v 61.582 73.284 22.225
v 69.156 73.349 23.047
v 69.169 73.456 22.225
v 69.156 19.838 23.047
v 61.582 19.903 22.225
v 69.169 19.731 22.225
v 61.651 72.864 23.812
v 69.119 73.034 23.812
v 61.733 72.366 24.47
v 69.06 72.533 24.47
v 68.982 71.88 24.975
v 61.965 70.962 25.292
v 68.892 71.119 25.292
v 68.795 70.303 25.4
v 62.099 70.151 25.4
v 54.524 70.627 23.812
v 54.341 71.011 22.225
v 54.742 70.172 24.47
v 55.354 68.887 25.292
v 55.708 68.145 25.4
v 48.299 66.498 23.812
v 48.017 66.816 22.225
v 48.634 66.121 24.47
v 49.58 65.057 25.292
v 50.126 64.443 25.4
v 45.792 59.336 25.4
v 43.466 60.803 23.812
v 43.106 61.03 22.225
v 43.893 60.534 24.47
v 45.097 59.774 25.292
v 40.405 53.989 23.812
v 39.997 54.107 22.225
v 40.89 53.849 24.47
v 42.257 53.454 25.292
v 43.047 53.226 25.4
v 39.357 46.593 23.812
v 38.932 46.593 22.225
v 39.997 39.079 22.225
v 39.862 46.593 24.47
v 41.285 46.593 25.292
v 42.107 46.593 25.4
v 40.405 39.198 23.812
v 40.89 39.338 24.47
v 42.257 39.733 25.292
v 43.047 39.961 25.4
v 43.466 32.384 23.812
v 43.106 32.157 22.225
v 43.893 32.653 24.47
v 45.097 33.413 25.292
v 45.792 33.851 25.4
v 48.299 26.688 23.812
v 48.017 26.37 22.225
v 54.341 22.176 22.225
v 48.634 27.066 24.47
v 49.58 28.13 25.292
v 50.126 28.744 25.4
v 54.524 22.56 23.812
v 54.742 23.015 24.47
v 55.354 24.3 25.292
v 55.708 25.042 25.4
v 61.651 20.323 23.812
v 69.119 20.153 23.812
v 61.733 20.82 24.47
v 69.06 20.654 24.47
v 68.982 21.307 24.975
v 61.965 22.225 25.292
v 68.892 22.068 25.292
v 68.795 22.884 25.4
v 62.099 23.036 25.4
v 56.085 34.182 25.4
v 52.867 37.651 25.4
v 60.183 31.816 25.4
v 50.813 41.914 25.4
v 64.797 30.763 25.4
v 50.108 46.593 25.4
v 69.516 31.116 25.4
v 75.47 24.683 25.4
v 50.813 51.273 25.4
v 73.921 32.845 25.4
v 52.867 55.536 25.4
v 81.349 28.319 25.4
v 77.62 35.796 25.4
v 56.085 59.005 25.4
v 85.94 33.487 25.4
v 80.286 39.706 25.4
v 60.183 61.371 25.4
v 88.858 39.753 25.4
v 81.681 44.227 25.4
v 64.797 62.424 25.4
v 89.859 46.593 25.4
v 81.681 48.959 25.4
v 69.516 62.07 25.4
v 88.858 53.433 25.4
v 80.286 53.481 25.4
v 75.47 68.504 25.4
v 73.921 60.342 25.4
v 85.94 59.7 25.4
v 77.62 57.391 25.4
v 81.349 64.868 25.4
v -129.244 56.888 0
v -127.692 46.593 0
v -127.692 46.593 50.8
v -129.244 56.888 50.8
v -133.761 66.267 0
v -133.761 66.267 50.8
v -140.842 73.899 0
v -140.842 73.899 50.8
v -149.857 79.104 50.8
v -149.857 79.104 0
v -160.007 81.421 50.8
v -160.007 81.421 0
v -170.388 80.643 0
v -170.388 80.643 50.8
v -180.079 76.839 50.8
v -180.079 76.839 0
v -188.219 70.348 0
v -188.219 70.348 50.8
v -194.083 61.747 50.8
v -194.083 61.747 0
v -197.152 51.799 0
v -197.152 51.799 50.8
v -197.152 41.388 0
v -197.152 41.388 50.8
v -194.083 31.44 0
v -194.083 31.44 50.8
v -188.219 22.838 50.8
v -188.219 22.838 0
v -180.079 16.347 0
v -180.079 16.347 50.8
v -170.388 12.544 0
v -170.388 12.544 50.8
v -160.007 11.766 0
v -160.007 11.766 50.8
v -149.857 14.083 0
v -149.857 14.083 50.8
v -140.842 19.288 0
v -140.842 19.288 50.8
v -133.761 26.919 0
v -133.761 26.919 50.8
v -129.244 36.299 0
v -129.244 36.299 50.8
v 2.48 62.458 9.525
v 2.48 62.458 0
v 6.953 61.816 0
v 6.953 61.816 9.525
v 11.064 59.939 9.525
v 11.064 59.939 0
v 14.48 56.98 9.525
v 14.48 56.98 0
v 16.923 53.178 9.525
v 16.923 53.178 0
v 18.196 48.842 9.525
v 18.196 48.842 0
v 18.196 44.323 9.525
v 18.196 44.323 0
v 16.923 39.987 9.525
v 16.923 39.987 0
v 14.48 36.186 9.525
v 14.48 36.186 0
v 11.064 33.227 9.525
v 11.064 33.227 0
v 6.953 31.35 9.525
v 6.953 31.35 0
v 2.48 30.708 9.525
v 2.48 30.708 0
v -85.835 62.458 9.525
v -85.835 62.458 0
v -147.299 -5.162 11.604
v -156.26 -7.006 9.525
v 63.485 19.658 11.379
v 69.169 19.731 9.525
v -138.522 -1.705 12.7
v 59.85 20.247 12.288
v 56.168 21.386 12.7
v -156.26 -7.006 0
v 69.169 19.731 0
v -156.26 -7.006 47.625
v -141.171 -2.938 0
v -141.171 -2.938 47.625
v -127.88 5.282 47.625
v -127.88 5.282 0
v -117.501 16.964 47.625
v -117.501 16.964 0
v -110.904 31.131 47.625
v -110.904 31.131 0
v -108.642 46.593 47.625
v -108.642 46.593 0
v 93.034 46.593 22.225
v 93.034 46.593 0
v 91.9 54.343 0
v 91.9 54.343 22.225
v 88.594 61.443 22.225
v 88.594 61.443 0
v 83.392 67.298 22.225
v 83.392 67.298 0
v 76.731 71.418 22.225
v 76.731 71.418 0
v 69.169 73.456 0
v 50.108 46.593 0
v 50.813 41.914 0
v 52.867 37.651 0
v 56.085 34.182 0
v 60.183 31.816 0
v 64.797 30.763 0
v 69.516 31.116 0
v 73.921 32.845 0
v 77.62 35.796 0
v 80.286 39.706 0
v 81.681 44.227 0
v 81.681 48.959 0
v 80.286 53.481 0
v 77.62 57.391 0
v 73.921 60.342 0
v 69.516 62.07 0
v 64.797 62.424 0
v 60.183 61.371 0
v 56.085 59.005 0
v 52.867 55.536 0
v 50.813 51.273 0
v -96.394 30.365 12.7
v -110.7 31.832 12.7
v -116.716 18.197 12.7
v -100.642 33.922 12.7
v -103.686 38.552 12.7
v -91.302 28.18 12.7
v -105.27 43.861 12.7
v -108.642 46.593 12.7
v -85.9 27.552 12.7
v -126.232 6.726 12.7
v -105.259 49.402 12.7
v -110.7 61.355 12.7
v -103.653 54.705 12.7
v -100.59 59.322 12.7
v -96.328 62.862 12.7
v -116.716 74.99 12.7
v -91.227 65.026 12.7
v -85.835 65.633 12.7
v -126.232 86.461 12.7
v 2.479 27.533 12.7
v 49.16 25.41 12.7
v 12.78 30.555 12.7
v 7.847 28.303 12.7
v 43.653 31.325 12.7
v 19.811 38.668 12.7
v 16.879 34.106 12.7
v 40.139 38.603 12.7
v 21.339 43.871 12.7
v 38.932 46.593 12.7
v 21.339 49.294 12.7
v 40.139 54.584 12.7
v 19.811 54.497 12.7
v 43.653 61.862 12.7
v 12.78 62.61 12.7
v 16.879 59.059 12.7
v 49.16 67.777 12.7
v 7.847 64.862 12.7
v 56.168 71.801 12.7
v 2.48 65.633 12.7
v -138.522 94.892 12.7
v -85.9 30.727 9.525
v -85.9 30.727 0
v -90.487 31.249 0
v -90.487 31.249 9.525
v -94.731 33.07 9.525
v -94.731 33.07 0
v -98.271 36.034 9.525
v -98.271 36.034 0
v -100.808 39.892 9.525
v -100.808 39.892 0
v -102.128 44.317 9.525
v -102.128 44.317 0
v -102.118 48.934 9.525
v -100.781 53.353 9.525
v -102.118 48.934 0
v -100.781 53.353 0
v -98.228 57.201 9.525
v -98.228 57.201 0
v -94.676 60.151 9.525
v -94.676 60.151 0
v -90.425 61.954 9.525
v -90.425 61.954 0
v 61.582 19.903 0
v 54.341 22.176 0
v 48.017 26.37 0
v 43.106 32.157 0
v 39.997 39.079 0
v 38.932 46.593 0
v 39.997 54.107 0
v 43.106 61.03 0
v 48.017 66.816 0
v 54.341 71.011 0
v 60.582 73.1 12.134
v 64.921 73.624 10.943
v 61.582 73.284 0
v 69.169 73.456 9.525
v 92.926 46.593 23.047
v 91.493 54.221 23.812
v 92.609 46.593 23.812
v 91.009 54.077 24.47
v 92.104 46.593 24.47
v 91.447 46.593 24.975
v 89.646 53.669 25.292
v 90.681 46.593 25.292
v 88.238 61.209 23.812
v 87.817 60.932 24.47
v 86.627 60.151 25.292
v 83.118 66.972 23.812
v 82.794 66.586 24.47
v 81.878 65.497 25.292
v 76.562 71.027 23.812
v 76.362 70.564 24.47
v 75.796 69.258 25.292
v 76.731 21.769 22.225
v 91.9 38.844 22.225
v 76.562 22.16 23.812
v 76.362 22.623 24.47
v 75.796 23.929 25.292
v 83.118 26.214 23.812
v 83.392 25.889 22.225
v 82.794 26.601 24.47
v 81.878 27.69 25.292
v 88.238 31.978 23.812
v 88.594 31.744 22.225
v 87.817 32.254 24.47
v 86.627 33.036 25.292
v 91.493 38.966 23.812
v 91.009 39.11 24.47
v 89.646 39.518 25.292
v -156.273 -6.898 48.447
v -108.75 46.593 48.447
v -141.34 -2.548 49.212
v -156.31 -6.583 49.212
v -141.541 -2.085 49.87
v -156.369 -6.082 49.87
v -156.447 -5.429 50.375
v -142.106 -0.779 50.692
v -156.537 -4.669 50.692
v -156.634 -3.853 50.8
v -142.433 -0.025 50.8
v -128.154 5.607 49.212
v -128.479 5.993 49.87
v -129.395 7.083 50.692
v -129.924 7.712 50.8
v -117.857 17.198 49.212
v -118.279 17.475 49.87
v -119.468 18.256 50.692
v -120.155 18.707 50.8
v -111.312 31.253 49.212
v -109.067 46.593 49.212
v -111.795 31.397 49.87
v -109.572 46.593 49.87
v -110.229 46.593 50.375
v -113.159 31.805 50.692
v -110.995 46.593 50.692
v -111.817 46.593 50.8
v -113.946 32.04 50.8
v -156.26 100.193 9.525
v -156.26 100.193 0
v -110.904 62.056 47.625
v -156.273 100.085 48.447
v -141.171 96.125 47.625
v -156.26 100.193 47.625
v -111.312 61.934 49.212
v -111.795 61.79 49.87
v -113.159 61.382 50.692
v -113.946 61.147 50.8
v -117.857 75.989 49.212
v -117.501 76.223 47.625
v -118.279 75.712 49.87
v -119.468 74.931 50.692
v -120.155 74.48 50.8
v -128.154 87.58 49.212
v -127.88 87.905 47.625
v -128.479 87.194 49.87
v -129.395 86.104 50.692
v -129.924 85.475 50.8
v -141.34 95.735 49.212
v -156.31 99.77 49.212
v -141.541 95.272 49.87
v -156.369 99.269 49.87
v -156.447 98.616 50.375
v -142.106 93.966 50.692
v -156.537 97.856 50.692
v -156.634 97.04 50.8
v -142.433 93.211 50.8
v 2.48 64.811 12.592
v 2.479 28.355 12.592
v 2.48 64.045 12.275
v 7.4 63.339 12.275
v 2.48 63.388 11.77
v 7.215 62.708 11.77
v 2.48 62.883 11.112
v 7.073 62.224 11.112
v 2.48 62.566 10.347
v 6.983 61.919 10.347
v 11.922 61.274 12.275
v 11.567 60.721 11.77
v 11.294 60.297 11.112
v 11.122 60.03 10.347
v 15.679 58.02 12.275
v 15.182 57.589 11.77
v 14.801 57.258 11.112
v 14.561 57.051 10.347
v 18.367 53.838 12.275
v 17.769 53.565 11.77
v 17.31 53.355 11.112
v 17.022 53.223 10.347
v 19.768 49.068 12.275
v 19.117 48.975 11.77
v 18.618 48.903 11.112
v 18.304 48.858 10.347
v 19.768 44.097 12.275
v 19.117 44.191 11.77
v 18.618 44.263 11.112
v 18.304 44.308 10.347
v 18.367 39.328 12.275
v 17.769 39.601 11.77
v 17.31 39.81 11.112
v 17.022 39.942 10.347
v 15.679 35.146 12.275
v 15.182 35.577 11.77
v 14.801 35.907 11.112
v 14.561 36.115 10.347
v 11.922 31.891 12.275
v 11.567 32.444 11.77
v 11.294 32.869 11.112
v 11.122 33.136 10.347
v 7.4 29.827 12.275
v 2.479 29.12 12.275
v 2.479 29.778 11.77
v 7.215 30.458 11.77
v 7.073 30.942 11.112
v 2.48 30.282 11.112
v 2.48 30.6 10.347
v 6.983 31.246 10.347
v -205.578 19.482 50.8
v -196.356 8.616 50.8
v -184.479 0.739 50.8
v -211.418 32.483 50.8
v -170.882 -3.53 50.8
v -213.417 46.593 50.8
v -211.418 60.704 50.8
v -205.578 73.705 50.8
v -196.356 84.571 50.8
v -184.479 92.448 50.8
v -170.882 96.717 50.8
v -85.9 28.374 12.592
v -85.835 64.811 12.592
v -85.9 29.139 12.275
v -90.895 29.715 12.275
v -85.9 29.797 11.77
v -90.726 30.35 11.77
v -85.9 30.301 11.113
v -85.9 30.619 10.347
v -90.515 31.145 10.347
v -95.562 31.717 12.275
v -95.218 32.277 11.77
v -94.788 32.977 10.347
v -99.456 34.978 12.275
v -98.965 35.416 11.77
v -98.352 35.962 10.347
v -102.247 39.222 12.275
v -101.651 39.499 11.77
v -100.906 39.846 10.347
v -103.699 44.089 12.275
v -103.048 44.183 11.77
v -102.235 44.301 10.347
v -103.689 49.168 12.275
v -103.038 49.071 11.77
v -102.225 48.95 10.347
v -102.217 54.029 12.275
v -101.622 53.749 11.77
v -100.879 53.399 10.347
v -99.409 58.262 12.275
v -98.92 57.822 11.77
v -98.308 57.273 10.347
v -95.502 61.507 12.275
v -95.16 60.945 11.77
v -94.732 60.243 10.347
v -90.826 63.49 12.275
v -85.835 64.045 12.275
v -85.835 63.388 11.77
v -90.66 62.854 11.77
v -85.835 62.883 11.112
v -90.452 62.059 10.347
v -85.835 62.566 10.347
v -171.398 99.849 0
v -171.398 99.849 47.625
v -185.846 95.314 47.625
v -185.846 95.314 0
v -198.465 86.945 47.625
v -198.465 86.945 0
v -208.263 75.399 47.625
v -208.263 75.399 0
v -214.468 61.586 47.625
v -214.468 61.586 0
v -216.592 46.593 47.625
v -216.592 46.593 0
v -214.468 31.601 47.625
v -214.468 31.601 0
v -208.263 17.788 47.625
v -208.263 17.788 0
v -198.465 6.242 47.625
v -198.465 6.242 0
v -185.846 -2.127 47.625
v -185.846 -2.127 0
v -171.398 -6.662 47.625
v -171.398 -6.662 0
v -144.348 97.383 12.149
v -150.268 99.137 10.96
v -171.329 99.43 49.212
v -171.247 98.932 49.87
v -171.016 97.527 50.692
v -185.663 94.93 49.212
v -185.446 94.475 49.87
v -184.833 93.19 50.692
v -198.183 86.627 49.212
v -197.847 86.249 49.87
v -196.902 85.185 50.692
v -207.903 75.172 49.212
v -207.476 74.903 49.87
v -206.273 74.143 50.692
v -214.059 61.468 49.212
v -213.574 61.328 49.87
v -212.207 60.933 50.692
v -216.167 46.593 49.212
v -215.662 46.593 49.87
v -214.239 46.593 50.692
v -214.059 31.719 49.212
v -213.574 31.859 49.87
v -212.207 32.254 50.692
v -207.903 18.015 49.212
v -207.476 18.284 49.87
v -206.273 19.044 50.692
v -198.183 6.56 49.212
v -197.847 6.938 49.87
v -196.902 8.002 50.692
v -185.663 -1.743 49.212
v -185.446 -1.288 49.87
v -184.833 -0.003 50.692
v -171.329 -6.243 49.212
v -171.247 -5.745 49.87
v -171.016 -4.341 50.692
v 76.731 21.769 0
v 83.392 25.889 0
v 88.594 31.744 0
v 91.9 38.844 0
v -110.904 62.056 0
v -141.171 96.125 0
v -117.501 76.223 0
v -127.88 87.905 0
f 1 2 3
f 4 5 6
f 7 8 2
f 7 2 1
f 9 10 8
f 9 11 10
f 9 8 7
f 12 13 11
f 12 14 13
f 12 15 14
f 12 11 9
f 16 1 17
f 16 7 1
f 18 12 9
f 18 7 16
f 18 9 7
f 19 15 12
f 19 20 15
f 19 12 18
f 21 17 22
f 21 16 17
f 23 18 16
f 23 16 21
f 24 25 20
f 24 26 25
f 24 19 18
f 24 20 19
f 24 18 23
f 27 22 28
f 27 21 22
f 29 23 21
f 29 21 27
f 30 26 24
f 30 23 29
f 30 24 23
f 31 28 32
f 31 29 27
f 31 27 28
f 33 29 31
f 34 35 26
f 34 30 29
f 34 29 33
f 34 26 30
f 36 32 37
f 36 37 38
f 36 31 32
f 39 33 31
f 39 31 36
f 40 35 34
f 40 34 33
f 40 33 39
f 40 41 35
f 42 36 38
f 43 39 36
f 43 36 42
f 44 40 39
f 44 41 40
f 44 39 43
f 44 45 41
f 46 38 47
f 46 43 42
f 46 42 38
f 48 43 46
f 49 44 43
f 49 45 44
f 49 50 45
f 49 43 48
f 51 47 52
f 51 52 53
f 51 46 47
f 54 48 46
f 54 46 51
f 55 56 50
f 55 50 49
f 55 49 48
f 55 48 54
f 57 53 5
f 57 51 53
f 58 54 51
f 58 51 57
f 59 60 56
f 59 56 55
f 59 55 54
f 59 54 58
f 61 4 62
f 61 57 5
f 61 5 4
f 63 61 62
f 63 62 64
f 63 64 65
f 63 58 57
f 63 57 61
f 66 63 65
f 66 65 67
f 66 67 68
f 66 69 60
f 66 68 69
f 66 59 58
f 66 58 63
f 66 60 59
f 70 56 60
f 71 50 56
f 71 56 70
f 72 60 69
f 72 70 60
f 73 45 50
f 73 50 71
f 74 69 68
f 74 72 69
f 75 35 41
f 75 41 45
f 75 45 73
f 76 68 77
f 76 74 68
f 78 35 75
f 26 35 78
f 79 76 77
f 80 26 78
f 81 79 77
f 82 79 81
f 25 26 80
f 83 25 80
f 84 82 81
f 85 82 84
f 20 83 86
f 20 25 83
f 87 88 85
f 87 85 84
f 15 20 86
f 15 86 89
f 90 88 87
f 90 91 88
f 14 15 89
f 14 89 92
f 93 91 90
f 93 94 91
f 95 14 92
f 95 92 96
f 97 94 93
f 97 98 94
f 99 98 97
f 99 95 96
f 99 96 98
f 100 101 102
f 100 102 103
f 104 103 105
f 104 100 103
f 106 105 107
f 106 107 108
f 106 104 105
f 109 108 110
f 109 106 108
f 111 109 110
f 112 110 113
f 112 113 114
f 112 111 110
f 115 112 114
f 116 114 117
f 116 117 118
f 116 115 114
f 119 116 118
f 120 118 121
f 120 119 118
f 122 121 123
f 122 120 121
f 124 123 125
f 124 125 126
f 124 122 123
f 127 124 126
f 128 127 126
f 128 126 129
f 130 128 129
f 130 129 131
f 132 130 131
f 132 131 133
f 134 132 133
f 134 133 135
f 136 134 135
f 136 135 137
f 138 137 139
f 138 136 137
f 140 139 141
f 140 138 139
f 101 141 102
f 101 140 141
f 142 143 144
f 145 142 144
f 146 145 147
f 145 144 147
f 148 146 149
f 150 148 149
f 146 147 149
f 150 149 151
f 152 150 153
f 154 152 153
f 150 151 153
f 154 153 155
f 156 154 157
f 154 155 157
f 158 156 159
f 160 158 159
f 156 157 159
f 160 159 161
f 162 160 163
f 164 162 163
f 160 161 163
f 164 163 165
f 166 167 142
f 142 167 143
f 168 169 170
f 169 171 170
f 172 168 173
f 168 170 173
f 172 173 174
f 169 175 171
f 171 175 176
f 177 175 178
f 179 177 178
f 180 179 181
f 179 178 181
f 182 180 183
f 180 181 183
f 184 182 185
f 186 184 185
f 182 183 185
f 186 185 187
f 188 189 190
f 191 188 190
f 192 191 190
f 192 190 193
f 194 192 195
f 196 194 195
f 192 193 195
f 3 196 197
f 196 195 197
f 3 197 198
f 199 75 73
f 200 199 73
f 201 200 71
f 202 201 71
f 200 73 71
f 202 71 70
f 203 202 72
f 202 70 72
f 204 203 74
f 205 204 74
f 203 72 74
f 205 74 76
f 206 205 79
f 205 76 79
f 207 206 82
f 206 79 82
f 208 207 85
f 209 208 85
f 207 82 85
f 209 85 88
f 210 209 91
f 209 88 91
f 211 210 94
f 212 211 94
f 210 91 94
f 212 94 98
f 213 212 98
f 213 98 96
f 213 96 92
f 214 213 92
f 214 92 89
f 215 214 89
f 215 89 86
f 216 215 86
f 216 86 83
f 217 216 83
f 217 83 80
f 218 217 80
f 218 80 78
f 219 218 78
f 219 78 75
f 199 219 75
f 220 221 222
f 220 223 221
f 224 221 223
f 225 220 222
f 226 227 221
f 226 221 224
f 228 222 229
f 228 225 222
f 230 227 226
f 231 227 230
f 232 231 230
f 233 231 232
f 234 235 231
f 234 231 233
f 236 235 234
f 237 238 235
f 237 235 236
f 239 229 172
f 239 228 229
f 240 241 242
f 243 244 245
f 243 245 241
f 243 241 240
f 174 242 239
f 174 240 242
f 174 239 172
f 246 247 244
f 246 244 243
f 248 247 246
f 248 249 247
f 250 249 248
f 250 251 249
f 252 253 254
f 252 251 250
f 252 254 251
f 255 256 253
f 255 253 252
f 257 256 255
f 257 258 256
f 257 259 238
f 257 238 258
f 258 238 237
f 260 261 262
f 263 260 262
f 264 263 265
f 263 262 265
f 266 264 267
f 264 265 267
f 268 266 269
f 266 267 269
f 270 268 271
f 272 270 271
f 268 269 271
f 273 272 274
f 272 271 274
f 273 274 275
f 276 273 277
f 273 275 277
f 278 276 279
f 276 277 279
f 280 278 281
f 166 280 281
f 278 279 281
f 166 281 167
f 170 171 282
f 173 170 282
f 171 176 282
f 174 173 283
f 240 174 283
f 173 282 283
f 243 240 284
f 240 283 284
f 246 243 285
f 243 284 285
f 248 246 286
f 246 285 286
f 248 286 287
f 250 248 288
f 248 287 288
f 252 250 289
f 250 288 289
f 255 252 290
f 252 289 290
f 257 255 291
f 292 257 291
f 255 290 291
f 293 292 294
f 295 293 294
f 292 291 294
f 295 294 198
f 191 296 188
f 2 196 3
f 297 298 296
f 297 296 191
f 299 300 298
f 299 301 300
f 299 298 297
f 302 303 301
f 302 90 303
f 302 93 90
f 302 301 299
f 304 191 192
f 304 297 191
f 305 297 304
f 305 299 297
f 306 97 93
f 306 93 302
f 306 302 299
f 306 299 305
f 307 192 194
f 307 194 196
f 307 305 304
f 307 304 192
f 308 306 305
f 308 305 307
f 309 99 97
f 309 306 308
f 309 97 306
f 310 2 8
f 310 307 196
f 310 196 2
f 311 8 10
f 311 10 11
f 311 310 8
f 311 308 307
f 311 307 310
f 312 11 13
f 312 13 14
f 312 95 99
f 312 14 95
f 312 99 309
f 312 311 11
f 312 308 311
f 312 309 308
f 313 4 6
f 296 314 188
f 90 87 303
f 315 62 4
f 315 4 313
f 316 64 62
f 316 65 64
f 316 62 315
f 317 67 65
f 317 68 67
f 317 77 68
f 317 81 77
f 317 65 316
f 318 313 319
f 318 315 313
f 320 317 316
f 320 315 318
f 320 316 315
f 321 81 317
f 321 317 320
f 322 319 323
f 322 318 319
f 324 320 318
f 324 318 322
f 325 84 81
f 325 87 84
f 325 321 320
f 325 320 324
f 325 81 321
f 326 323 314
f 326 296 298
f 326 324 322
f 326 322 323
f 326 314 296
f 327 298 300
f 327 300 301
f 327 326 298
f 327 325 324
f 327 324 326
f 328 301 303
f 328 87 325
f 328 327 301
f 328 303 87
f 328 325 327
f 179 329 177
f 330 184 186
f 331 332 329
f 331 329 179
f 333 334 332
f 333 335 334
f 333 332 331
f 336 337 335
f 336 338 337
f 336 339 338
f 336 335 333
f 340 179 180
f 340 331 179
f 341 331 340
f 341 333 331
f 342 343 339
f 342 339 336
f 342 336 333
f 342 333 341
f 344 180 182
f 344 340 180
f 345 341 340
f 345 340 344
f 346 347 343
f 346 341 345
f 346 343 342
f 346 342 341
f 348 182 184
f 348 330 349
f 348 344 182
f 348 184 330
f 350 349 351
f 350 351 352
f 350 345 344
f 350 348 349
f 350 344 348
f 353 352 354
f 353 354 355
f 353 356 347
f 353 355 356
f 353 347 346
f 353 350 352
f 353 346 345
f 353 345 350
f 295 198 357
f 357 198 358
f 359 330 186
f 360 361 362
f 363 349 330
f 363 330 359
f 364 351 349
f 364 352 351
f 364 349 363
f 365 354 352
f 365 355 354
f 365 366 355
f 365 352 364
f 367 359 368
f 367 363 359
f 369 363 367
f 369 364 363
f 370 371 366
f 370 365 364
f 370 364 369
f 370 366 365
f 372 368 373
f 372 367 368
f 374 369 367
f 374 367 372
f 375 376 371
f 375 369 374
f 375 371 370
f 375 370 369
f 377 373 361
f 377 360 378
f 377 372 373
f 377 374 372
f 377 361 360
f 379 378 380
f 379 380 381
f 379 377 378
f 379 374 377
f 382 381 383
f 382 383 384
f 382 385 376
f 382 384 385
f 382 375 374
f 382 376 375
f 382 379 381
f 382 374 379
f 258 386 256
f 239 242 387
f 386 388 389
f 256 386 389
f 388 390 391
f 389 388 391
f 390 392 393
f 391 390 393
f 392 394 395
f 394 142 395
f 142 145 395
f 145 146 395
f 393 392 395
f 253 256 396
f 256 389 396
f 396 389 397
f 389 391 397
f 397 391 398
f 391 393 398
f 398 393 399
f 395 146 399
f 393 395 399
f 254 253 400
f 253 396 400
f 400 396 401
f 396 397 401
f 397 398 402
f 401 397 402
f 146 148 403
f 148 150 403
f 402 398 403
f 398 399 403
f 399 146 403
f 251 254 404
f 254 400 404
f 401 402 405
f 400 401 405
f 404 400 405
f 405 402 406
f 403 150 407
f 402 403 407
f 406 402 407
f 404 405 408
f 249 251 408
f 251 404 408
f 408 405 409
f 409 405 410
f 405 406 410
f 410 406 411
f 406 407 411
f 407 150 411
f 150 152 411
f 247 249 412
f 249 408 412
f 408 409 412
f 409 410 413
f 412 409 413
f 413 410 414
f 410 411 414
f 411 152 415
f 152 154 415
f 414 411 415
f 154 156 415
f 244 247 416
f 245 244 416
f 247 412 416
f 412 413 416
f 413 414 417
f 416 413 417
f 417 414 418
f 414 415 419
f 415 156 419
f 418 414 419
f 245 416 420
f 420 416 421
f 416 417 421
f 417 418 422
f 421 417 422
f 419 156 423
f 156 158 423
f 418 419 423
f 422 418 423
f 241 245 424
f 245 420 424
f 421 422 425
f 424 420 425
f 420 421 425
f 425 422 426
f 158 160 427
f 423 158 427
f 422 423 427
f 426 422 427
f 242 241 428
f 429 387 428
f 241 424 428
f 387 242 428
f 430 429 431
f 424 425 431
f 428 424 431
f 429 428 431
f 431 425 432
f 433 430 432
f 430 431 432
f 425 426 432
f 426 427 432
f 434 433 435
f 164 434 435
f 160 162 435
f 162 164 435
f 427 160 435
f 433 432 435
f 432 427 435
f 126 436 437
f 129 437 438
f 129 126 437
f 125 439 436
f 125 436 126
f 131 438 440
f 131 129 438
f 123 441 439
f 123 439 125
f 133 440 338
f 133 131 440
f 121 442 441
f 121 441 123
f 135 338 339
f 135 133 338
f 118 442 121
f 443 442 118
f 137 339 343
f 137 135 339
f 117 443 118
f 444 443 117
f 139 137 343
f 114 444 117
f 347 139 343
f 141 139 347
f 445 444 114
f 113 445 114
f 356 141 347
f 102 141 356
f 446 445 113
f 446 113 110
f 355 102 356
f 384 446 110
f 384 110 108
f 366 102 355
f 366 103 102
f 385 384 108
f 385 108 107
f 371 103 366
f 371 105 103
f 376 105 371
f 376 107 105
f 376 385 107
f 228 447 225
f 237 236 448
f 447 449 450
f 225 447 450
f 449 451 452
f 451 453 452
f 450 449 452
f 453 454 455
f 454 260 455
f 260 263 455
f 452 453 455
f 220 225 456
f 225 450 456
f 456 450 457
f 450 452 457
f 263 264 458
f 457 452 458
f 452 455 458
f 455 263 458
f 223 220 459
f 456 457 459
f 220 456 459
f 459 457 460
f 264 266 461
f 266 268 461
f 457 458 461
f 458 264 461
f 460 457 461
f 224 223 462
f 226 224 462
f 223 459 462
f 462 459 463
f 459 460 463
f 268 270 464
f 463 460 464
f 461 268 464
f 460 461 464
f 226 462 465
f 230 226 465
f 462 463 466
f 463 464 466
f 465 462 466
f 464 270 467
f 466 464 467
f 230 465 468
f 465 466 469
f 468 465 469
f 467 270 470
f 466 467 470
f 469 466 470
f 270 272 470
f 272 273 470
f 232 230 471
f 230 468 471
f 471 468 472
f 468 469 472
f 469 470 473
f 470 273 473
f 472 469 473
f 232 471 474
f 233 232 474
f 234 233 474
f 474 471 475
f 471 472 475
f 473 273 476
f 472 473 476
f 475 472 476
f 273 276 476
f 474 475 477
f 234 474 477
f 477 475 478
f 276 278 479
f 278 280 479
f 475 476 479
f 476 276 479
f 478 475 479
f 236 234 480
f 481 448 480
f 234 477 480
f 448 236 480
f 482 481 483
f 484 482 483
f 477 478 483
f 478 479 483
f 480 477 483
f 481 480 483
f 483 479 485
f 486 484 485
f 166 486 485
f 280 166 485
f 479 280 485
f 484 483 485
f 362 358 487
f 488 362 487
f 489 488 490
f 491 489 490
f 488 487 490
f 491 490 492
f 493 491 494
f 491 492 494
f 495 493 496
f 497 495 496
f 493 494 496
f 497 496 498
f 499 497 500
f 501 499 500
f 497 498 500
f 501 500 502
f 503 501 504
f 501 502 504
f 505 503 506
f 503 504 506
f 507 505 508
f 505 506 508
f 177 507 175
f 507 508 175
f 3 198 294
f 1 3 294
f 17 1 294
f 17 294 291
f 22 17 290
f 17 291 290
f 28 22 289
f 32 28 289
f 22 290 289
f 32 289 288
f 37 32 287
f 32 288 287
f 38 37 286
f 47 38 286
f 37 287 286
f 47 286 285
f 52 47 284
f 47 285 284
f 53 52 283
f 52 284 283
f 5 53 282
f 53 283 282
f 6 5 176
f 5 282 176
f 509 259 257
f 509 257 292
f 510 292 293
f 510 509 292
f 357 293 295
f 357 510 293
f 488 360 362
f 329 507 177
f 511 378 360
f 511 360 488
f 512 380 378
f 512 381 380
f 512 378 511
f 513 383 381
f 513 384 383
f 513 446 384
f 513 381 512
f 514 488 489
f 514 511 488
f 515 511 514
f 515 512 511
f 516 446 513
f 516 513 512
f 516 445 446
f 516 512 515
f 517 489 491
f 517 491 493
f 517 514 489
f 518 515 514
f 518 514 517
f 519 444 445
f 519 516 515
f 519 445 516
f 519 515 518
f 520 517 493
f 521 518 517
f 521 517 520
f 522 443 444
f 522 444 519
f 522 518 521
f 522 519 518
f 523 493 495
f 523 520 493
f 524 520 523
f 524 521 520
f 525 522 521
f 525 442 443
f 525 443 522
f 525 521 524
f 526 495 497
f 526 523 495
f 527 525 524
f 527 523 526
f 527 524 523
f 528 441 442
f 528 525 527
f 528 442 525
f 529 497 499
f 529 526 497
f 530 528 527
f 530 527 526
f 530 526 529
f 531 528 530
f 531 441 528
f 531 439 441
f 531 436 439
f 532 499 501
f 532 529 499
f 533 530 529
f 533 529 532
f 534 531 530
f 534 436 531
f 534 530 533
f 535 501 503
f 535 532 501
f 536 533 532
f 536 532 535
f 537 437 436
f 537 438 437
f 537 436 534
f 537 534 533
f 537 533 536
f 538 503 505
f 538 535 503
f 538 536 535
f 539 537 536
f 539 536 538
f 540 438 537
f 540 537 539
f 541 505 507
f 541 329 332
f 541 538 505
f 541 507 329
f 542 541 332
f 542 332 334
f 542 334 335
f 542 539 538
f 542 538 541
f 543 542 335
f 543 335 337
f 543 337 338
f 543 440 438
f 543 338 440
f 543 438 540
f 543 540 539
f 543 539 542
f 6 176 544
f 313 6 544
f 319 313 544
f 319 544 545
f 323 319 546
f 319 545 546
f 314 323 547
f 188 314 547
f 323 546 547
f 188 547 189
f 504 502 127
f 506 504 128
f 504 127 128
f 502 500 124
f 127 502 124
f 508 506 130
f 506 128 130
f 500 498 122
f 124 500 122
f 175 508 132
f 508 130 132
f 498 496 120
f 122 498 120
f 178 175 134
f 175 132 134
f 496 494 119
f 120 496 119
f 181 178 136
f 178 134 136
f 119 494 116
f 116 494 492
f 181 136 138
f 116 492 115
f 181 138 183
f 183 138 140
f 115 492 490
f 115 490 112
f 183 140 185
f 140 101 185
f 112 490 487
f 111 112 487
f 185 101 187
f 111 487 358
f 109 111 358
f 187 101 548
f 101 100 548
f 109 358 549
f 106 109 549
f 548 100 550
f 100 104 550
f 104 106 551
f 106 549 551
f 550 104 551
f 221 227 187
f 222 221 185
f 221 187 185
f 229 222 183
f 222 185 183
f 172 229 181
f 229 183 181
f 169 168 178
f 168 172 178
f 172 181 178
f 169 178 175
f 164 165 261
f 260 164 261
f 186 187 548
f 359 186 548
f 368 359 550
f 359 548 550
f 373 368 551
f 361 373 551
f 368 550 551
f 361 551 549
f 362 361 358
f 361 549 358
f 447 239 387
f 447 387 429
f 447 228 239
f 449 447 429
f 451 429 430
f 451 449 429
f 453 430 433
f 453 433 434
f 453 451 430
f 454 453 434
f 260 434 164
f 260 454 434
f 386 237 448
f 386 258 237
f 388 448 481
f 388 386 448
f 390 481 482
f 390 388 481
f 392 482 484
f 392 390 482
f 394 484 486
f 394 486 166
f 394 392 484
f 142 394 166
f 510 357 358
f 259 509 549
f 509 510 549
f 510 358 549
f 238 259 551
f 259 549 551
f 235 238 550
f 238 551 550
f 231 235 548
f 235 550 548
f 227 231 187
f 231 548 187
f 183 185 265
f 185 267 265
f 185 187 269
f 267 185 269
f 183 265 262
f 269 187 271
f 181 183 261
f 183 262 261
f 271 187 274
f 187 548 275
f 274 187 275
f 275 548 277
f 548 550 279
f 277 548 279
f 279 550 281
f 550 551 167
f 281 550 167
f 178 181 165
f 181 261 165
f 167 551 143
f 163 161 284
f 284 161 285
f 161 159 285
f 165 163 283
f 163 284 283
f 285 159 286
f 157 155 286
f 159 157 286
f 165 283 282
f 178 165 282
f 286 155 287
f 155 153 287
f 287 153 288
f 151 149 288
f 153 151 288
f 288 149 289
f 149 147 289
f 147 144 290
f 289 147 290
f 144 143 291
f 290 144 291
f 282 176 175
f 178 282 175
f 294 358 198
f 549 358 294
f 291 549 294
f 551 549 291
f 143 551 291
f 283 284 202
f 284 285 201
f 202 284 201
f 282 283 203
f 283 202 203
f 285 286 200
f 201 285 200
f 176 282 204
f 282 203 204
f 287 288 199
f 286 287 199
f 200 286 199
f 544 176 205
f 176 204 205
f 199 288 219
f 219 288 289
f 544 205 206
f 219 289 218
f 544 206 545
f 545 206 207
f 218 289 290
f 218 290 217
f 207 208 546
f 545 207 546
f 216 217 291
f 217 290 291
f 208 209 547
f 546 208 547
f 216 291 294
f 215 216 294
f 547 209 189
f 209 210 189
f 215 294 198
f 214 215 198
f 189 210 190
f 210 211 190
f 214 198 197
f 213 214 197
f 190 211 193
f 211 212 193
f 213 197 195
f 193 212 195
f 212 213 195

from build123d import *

# Parameters (mm, degrees)
F0_R     = 34.925
F1_DEPTH = 50.8
F0_R_2   = 12.7
F2_DEPTH = 25.4
F3_DEPTH = 12.7
F4_R     = 3.175
F5_R     = 3.175
F5_2_R   = 3.175
F5_3_R   = 3.175
F6_R     = 3.175
F7_D     = 31.75


with BuildPart() as f1:
    # F0 (on Top) → F1 (new body)
    with BuildSketch(Plane.XY):
        with BuildLine():
            ThreePointArc((-156.2598375408, -7.0058976266), (-122.2657921287, 10.7452932364), (-108.6418930964, 46.5934351087))
            ThreePointArc((-108.6418930964, 46.5934351087), (-122.2657921287, 82.4415769809), (-156.2598375408, 100.1927678439))
            ThreePointArc((-156.2598375408, 100.1927678439), (-216.5918930964, 46.5934351087), (-156.2598375408, -7.0058976266))
        make_face()
        with Locations((-162.6168930964, 46.5934351087)):
            Circle(F0_R, mode=Mode.SUBTRACT)
    extrude(amount=F1_DEPTH)

    # F5#2
    f5_2_edges = [f1.edges().sort_by_distance(p)[0] for p in [
        (-168.973949, 100.192768, 50.8),
    ]]
    fillet(f5_2_edges, radius=F5_2_R)


with BuildPart() as f2:
    # F0 (on Top) → F2 (new body)
    with BuildSketch(Plane.XY):
        with BuildLine():
            ThreePointArc((93.0341069036, 46.5934351087), (86.2061292709, 64.5596803294), (69.1691135703, 73.4561595148))
            ThreePointArc((69.1691135703, 73.4561595148), (38.9321069036, 46.5934351087), (69.1691135703, 19.7307107025))
            ThreePointArc((69.1691135703, 19.7307107025), (86.2061292709, 28.627189888), (93.0341069036, 46.5934351087))
        make_face()
        with Locations((65.9831069036, 46.5934351087)):
            Circle(F0_R_2, mode=Mode.SUBTRACT)
    extrude(amount=F2_DEPTH)

    # F5#3
    f5_3_edges = [f2.edges().sort_by_distance(p)[0] for p in [
        (62.7971, 73.45616, 25.4),
    ]]
    fillet(f5_3_edges, radius=F5_3_R)

    # F7 (through all)
    with Locations(Plane(origin=(0, 0, 0), x_dir=(1, 0, 0), z_dir=(0, 0, -1))):
        with Locations((-162.6168930964, -46.5934351087), (65.9831069036, -46.5934351087)):
            Hole(F7_D / 2)


with BuildPart() as f3:
    # F0 (on Top) → F3 (new body)
    with BuildSketch(Plane.XY):
        with BuildLine():
            ThreePointArc((-156.2598375408, 100.1927678439), (-122.2657921287, 82.4415769809), (-108.6418930964, 46.5934351087))
            ThreePointArc((-108.6418930964, 46.5934351087), (-122.2657921287, 10.7452932364), (-156.2598375408, -7.0058976266))
            Line((-156.2598375408, -7.0058976266), (69.1691135703, 19.7307107025))
            ThreePointArc((69.1691135703, 19.7307107025), (38.9321069036, 46.5934351087), (69.1691135703, 73.4561595148))
            Line((69.1691135703, 73.4561595148), (-156.2598375408, 100.1927678439))
        make_face()
        with BuildLine():
            ThreePointArc((-85.8997801759, 30.726859573), (-102.2918603699, 46.6256696303), (-85.8353497418, 62.457779795))
            Line((-85.8353497418, 62.457779795), (2.4796797332, 62.4577790551))
            ThreePointArc((2.4796797332, 62.4577790551), (18.3581069036, 46.5827794251), (2.4796797332, 30.707779795))
            Line((2.4796797332, 30.707779795), (-85.8997801759, 30.726859573))
        make_face(mode=Mode.SUBTRACT)
    extrude(amount=F3_DEPTH)

    # F4
    f4_edges = [f3.edges().sort_by_distance(p)[0] for p in [
        (-43.545362, 6.362407, 12.7),
    ]]
    fillet(f4_edges, radius=F4_R)

    # F5
    f5_edges = [f3.edges().sort_by_distance(p)[0] for p in [
        (-43.545362, 86.824464, 12.7),
    ]]
    fillet(f5_edges, radius=F5_R)

    # F6
    f6_edges = [f3.edges().sort_by_distance(p)[0] for p in [
        (-41.677835, 62.457779, 12.7),
        (-41.71005, 30.71732, 12.7),
        (-102.29186, 46.62567, 12.7),
        (18.358107, 46.582779, 12.7),
    ]]
    fillet(f6_edges, radius=F6_R)


solid = Compound([f1.part, f2.part, f3.part])
